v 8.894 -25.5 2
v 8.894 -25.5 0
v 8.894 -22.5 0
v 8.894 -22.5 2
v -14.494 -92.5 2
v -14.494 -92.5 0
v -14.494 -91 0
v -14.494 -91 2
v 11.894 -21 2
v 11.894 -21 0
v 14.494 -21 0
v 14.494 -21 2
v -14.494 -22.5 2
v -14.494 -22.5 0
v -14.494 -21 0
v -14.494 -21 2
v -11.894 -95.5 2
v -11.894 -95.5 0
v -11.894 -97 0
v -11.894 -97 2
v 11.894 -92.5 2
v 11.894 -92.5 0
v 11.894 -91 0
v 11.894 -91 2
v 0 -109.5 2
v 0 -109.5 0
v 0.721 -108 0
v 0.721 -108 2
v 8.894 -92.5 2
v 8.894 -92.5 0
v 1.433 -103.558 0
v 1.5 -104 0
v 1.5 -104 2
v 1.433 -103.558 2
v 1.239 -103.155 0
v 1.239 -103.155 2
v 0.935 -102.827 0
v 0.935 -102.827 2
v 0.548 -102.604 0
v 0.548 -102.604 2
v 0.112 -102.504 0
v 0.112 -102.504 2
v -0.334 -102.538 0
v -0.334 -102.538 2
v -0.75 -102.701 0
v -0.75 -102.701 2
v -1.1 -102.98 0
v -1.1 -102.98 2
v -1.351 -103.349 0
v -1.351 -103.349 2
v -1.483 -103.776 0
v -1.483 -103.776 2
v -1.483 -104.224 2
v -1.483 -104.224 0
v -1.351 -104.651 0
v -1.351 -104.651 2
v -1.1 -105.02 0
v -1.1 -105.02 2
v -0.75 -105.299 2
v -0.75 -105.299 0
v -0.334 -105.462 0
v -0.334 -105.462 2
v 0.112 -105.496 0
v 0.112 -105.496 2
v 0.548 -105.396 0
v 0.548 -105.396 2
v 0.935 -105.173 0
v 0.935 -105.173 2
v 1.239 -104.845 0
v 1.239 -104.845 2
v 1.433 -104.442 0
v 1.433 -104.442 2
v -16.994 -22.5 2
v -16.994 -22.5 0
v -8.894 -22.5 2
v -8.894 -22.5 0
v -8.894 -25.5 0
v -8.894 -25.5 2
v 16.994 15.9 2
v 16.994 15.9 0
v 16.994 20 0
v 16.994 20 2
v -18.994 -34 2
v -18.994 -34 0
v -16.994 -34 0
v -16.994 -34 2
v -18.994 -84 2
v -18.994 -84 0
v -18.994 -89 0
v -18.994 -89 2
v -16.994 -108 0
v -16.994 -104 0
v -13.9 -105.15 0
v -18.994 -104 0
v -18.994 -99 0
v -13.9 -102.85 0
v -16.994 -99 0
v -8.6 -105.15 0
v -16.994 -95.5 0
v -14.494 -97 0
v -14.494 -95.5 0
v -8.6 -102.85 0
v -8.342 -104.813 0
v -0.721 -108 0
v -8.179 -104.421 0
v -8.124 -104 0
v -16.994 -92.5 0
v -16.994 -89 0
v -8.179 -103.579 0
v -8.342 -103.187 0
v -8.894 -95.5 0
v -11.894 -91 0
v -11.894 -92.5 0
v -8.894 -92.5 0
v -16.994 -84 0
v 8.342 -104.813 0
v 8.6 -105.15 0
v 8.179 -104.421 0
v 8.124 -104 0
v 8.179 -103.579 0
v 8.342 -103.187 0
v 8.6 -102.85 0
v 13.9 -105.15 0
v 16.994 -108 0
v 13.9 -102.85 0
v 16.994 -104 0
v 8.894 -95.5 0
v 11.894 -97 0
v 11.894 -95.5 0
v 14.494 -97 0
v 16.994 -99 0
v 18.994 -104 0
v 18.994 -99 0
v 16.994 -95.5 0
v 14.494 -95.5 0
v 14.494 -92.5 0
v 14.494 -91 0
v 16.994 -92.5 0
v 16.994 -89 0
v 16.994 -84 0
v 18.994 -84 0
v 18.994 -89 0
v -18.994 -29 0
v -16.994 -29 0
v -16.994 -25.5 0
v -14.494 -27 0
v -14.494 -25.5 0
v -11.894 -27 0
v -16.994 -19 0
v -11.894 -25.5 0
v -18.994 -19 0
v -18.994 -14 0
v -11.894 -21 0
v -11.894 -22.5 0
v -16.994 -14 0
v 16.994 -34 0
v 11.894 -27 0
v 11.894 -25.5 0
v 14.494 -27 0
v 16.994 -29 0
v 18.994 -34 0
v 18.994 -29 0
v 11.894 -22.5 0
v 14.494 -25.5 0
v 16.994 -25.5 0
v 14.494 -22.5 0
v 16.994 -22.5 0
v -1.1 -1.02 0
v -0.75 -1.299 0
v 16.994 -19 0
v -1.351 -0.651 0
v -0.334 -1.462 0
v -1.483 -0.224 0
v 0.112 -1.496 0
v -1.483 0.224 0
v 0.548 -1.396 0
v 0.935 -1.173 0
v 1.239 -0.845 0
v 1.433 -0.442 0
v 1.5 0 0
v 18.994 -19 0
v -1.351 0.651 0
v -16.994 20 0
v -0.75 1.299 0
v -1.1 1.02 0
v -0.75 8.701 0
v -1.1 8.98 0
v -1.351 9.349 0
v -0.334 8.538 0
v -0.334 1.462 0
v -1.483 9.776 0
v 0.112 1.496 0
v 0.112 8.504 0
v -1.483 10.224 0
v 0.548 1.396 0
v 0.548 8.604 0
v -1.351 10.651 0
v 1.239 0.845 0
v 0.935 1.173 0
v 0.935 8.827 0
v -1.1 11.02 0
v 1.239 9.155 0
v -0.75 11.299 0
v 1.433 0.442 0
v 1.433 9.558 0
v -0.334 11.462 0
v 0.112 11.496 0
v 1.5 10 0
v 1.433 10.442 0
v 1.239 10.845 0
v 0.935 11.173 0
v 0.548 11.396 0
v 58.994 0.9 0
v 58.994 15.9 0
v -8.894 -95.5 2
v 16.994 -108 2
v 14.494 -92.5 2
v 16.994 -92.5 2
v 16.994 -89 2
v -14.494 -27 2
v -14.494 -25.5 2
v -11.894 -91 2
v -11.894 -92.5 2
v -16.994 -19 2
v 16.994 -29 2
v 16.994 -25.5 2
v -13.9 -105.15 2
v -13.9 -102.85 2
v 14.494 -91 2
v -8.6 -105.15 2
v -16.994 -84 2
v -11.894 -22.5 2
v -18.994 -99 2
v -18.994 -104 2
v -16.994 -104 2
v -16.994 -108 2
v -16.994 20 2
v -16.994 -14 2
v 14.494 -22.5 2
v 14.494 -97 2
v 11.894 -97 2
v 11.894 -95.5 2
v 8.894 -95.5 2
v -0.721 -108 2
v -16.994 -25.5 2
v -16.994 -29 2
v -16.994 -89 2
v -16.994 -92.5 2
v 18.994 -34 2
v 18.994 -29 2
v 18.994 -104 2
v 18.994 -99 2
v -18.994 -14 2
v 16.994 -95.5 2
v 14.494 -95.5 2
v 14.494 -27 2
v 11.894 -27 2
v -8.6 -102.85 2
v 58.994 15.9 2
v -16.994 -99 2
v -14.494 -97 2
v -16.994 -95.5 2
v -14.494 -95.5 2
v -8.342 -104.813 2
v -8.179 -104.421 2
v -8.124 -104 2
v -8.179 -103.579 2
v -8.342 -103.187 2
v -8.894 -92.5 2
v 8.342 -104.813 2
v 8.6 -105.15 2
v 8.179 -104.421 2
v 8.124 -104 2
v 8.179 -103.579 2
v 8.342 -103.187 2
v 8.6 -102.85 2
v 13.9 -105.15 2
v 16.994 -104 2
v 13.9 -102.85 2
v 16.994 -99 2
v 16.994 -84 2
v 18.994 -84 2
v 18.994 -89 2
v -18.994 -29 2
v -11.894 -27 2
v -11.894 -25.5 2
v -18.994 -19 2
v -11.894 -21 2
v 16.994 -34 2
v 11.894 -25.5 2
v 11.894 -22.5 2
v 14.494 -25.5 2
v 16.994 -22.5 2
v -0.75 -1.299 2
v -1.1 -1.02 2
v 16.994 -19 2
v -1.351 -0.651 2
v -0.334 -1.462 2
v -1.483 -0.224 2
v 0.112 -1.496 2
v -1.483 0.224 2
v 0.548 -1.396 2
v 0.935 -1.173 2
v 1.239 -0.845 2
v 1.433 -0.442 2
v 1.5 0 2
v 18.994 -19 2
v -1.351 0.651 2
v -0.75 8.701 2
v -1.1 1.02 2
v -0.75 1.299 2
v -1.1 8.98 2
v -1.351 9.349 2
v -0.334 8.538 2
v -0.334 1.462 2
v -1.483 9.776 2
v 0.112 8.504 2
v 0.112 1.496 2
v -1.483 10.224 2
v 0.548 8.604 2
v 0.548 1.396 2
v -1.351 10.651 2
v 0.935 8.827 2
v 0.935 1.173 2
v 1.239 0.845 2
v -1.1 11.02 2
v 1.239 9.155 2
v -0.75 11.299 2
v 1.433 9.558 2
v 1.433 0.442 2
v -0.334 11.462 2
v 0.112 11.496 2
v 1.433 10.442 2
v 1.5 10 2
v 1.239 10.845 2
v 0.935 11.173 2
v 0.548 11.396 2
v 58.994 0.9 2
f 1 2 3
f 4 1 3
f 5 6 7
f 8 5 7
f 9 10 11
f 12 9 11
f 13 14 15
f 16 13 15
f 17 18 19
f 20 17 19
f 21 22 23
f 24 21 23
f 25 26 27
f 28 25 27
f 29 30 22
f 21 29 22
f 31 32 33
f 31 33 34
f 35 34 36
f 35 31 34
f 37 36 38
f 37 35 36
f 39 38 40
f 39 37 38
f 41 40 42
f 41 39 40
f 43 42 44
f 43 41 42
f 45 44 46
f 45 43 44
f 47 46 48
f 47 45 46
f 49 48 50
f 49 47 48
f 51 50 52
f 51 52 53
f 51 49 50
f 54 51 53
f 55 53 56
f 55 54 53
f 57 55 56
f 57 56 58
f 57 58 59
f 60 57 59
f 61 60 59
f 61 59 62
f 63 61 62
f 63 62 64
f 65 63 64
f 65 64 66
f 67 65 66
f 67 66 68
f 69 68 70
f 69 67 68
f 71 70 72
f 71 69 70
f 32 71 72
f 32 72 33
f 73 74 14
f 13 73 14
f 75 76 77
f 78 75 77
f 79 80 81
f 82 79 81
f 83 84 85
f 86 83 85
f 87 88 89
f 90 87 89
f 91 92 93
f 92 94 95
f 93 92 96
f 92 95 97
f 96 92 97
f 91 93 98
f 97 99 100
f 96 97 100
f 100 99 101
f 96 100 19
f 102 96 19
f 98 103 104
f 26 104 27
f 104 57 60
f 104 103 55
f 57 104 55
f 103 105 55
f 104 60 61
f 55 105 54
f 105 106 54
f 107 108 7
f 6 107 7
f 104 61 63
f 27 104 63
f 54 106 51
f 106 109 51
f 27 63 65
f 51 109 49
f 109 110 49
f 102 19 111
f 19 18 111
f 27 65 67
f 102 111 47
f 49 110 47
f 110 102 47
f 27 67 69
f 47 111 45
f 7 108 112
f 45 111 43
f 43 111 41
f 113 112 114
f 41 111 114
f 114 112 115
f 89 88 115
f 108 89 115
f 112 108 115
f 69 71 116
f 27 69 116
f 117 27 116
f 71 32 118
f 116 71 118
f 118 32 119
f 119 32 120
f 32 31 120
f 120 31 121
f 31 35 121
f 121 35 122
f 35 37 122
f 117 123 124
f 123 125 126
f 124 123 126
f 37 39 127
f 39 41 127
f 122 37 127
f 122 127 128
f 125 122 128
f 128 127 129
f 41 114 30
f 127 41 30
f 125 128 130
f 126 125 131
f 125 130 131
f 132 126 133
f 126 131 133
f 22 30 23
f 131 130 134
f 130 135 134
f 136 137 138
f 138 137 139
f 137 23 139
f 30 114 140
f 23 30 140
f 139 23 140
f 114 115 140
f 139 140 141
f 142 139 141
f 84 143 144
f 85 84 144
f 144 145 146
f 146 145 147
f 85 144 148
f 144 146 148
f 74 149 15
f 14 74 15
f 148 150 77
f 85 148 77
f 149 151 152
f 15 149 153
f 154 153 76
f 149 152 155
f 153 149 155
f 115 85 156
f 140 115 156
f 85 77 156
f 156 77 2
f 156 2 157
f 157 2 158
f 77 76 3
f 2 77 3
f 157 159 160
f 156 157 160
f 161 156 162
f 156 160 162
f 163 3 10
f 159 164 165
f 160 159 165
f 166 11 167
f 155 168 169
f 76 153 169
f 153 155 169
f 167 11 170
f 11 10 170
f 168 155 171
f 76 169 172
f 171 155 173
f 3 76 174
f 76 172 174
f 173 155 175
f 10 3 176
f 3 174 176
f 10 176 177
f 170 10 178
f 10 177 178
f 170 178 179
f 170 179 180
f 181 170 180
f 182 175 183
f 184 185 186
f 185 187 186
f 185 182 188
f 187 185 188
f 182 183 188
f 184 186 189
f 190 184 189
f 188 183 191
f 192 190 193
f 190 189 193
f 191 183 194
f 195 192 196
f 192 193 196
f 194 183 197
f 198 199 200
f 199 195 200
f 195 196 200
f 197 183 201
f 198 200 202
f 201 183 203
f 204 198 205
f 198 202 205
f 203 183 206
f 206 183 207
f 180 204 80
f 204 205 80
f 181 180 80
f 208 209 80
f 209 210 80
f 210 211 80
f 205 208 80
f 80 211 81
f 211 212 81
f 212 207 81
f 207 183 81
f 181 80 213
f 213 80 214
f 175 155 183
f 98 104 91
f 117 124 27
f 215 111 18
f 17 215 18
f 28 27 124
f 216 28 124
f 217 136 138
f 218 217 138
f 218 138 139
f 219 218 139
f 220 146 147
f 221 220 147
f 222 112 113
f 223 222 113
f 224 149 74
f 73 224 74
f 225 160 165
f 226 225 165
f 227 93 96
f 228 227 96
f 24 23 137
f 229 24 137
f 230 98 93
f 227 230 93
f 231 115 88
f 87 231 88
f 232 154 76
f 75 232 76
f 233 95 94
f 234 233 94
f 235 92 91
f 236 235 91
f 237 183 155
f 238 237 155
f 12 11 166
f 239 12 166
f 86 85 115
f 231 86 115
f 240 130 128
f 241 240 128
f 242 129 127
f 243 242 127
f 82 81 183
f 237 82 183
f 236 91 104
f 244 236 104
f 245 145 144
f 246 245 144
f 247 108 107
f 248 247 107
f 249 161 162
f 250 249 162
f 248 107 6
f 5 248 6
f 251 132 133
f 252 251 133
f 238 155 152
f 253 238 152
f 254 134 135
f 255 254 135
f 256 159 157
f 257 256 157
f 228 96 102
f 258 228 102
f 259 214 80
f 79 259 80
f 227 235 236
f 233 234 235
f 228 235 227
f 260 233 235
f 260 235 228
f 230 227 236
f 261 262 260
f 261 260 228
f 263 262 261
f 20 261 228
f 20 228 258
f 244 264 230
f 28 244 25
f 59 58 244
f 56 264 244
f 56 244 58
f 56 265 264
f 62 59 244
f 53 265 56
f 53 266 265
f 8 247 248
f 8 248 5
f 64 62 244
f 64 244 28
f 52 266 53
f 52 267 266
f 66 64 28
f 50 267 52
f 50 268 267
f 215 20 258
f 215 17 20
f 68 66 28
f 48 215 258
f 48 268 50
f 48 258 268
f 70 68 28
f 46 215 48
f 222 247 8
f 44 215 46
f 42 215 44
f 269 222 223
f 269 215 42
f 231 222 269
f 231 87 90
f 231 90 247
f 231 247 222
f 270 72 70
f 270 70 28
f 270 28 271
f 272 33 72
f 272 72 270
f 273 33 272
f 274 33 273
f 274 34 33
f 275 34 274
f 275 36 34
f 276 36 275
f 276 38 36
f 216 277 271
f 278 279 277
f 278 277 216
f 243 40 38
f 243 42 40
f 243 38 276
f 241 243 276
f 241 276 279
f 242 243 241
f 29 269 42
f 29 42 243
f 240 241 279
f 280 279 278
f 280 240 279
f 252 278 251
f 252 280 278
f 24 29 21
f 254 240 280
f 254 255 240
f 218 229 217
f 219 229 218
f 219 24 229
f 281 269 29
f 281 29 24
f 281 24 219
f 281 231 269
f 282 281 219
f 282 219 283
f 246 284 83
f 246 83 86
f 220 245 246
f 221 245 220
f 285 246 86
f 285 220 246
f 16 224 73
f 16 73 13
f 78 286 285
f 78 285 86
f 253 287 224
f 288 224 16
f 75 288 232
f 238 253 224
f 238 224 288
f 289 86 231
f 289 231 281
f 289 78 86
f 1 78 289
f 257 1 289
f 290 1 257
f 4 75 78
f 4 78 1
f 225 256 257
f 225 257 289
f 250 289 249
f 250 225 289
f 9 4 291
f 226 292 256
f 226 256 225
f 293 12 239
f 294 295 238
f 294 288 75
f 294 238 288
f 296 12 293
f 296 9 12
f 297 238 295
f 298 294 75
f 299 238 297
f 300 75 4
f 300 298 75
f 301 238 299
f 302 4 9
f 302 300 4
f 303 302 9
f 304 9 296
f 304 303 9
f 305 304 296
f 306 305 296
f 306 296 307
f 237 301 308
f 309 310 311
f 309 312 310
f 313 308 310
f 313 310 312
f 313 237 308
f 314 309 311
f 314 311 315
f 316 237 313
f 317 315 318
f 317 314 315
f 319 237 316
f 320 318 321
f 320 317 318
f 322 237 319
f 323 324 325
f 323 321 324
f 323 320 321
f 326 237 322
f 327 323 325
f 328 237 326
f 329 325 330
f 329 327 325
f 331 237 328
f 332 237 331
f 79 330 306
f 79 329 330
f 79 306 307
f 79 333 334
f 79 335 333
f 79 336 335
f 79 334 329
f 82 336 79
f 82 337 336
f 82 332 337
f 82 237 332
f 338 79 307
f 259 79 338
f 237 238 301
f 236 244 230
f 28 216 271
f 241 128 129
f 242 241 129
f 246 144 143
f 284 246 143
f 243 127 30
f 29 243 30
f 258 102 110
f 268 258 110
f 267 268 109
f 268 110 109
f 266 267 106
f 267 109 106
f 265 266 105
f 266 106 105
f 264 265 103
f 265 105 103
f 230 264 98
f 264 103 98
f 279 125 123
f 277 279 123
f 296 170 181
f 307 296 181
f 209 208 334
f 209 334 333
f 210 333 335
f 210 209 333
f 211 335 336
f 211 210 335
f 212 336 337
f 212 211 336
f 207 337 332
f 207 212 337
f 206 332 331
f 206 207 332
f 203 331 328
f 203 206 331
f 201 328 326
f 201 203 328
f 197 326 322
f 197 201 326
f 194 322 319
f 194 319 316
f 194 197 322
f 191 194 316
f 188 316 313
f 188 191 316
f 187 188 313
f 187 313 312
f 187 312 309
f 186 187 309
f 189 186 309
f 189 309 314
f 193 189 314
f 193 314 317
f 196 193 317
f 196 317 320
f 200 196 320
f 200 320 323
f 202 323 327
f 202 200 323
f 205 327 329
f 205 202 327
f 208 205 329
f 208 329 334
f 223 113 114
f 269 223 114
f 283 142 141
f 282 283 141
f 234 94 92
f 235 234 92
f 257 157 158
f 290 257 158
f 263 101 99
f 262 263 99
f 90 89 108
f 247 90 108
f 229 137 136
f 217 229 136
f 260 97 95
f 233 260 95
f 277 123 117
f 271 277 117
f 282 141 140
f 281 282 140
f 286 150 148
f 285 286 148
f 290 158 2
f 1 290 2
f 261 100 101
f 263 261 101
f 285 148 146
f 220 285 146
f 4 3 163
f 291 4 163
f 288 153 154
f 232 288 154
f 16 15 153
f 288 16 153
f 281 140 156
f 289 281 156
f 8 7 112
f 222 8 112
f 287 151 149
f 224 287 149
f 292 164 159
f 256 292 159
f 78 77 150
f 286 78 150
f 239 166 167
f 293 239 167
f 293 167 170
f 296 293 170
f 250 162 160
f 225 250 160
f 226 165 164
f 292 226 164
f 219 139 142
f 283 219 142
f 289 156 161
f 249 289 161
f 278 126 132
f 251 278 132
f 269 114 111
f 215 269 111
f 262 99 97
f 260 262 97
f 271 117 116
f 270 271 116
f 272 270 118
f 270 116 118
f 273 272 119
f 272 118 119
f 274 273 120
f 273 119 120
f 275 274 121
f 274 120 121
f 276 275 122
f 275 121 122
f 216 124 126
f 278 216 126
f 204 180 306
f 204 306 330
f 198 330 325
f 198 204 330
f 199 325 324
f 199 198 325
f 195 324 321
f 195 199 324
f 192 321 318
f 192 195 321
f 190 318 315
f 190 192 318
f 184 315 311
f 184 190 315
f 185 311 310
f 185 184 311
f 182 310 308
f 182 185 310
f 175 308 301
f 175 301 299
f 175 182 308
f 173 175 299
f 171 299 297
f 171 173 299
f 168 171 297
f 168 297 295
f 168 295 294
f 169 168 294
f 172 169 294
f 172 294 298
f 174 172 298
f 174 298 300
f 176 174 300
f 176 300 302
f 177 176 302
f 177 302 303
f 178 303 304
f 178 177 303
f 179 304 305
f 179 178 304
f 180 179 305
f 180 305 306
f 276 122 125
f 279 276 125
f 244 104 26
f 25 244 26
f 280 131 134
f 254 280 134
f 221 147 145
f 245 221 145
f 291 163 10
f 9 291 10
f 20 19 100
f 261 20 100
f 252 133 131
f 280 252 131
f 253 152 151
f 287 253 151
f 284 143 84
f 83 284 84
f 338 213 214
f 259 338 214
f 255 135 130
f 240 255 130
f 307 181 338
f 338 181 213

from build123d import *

# Parameters (mm, degrees)
SKETCH_1_R      = 1.5
EXTRUDE_1_DEPTH = 2


with BuildPart() as part:
    # 草图1 → 凸台-拉伸1 (new body)
    with BuildSketch(Plane.XY):
        Polygon((16.993865071, 15.9), (16.993865071, 20), (-16.993865071, 20), (-16.993865071, 15.9), (-16.993865071, -14), (-18.993865071, -14), (-18.993865071, -19), (-16.993865071, -19), (-16.993865071, -22.5), (-14.493865071, -22.5), (-14.493865071, -21), (-11.893865071, -21), (-11.893865071, -22.5), (-8.893865071, -22.5), (-8.893865071, -25.5), (-11.893865071, -25.5), (-11.893865071, -27), (-14.493865071, -27), (-14.493865071, -25.5), (-16.993865071, -25.5), (-16.993865071, -29), (-18.993865071, -29), (-18.993865071, -34), (-16.993865071, -34), (-16.993865071, -84), (-18.993865071, -84), (-18.993865071, -89), (-16.993865071, -89), (-16.993865071, -92.5), (-14.493865071, -92.5), (-14.493865071, -91), (-11.893865071, -91), (-11.893865071, -92.5), (-8.893865071, -92.5), (-8.893865071, -95.5), (-11.893865071, -95.5), (-11.893865071, -97), (-14.493865071, -97), (-14.493865071, -95.5), (-16.993865071, -95.5), (-16.993865071, -99), (-18.993865071, -99), (-18.993865071, -104), (-16.993865071, -104), (-16.993865071, -108), (-0.721190694, -108), (0, -109.5), (0.721190694, -108), (16.993865071, -108), (16.993865071, -104), (18.993865071, -104), (18.993865071, -99), (16.993865071, -99), (16.993865071, -95.5), (14.493865071, -95.5), (14.493865071, -97), (11.893865071, -97), (11.893865071, -95.5), (8.893865071, -95.5), (8.893865071, -92.5), (11.893865071, -92.5), (11.893865071, -91), (14.493865071, -91), (14.493865071, -92.5), (16.993865071, -92.5), (16.993865071, -89), (18.993865071, -89), (18.993865071, -84), (16.993865071, -84), (16.993865071, -34), (18.993865071, -34), (18.993865071, -29), (16.993865071, -29), (16.993865071, -25.5), (14.493865071, -25.5), (14.493865071, -27), (11.893865071, -27), (11.893865071, -25.5), (8.893865071, -25.5), (8.893865071, -22.5), (11.893865071, -22.5), (11.893865071, -21), (14.493865071, -21), (14.493865071, -22.5), (16.993865071, -22.5), (16.993865071, -19), (18.993865071, -19), (58.993865071, 0.9), (58.993865071, 15.9), align=None)
        with Locations((0, -104)):
            Circle(SKETCH_1_R, mode=Mode.SUBTRACT)
        Circle(SKETCH_1_R, mode=Mode.SUBTRACT)
        with Locations((0, 10)):
            Circle(SKETCH_1_R, mode=Mode.SUBTRACT)
        with BuildLine():
            Line((-13.9, -102.85), (-8.6, -102.85))
            ThreePointArc((-8.6, -102.85), (-8.123654403, -104), (-8.6, -105.15))
            Line((-8.6, -105.15), (-13.9, -105.15))
            Line((-13.9, -105.15), (-13.9, -102.85))
        make_face(mode=Mode.SUBTRACT)
        with BuildLine():
            Line((13.9, -105.15), (8.6, -105.15))
            ThreePointArc((8.6, -105.15), (8.123654403, -104), (8.6, -102.85))
            Line((8.6, -102.85), (13.9, -102.85))
            Line((13.9, -102.85), (13.9, -105.15))
        make_face(mode=Mode.SUBTRACT)
    extrude(amount=EXTRUDE_1_DEPTH)


solid = part.part
